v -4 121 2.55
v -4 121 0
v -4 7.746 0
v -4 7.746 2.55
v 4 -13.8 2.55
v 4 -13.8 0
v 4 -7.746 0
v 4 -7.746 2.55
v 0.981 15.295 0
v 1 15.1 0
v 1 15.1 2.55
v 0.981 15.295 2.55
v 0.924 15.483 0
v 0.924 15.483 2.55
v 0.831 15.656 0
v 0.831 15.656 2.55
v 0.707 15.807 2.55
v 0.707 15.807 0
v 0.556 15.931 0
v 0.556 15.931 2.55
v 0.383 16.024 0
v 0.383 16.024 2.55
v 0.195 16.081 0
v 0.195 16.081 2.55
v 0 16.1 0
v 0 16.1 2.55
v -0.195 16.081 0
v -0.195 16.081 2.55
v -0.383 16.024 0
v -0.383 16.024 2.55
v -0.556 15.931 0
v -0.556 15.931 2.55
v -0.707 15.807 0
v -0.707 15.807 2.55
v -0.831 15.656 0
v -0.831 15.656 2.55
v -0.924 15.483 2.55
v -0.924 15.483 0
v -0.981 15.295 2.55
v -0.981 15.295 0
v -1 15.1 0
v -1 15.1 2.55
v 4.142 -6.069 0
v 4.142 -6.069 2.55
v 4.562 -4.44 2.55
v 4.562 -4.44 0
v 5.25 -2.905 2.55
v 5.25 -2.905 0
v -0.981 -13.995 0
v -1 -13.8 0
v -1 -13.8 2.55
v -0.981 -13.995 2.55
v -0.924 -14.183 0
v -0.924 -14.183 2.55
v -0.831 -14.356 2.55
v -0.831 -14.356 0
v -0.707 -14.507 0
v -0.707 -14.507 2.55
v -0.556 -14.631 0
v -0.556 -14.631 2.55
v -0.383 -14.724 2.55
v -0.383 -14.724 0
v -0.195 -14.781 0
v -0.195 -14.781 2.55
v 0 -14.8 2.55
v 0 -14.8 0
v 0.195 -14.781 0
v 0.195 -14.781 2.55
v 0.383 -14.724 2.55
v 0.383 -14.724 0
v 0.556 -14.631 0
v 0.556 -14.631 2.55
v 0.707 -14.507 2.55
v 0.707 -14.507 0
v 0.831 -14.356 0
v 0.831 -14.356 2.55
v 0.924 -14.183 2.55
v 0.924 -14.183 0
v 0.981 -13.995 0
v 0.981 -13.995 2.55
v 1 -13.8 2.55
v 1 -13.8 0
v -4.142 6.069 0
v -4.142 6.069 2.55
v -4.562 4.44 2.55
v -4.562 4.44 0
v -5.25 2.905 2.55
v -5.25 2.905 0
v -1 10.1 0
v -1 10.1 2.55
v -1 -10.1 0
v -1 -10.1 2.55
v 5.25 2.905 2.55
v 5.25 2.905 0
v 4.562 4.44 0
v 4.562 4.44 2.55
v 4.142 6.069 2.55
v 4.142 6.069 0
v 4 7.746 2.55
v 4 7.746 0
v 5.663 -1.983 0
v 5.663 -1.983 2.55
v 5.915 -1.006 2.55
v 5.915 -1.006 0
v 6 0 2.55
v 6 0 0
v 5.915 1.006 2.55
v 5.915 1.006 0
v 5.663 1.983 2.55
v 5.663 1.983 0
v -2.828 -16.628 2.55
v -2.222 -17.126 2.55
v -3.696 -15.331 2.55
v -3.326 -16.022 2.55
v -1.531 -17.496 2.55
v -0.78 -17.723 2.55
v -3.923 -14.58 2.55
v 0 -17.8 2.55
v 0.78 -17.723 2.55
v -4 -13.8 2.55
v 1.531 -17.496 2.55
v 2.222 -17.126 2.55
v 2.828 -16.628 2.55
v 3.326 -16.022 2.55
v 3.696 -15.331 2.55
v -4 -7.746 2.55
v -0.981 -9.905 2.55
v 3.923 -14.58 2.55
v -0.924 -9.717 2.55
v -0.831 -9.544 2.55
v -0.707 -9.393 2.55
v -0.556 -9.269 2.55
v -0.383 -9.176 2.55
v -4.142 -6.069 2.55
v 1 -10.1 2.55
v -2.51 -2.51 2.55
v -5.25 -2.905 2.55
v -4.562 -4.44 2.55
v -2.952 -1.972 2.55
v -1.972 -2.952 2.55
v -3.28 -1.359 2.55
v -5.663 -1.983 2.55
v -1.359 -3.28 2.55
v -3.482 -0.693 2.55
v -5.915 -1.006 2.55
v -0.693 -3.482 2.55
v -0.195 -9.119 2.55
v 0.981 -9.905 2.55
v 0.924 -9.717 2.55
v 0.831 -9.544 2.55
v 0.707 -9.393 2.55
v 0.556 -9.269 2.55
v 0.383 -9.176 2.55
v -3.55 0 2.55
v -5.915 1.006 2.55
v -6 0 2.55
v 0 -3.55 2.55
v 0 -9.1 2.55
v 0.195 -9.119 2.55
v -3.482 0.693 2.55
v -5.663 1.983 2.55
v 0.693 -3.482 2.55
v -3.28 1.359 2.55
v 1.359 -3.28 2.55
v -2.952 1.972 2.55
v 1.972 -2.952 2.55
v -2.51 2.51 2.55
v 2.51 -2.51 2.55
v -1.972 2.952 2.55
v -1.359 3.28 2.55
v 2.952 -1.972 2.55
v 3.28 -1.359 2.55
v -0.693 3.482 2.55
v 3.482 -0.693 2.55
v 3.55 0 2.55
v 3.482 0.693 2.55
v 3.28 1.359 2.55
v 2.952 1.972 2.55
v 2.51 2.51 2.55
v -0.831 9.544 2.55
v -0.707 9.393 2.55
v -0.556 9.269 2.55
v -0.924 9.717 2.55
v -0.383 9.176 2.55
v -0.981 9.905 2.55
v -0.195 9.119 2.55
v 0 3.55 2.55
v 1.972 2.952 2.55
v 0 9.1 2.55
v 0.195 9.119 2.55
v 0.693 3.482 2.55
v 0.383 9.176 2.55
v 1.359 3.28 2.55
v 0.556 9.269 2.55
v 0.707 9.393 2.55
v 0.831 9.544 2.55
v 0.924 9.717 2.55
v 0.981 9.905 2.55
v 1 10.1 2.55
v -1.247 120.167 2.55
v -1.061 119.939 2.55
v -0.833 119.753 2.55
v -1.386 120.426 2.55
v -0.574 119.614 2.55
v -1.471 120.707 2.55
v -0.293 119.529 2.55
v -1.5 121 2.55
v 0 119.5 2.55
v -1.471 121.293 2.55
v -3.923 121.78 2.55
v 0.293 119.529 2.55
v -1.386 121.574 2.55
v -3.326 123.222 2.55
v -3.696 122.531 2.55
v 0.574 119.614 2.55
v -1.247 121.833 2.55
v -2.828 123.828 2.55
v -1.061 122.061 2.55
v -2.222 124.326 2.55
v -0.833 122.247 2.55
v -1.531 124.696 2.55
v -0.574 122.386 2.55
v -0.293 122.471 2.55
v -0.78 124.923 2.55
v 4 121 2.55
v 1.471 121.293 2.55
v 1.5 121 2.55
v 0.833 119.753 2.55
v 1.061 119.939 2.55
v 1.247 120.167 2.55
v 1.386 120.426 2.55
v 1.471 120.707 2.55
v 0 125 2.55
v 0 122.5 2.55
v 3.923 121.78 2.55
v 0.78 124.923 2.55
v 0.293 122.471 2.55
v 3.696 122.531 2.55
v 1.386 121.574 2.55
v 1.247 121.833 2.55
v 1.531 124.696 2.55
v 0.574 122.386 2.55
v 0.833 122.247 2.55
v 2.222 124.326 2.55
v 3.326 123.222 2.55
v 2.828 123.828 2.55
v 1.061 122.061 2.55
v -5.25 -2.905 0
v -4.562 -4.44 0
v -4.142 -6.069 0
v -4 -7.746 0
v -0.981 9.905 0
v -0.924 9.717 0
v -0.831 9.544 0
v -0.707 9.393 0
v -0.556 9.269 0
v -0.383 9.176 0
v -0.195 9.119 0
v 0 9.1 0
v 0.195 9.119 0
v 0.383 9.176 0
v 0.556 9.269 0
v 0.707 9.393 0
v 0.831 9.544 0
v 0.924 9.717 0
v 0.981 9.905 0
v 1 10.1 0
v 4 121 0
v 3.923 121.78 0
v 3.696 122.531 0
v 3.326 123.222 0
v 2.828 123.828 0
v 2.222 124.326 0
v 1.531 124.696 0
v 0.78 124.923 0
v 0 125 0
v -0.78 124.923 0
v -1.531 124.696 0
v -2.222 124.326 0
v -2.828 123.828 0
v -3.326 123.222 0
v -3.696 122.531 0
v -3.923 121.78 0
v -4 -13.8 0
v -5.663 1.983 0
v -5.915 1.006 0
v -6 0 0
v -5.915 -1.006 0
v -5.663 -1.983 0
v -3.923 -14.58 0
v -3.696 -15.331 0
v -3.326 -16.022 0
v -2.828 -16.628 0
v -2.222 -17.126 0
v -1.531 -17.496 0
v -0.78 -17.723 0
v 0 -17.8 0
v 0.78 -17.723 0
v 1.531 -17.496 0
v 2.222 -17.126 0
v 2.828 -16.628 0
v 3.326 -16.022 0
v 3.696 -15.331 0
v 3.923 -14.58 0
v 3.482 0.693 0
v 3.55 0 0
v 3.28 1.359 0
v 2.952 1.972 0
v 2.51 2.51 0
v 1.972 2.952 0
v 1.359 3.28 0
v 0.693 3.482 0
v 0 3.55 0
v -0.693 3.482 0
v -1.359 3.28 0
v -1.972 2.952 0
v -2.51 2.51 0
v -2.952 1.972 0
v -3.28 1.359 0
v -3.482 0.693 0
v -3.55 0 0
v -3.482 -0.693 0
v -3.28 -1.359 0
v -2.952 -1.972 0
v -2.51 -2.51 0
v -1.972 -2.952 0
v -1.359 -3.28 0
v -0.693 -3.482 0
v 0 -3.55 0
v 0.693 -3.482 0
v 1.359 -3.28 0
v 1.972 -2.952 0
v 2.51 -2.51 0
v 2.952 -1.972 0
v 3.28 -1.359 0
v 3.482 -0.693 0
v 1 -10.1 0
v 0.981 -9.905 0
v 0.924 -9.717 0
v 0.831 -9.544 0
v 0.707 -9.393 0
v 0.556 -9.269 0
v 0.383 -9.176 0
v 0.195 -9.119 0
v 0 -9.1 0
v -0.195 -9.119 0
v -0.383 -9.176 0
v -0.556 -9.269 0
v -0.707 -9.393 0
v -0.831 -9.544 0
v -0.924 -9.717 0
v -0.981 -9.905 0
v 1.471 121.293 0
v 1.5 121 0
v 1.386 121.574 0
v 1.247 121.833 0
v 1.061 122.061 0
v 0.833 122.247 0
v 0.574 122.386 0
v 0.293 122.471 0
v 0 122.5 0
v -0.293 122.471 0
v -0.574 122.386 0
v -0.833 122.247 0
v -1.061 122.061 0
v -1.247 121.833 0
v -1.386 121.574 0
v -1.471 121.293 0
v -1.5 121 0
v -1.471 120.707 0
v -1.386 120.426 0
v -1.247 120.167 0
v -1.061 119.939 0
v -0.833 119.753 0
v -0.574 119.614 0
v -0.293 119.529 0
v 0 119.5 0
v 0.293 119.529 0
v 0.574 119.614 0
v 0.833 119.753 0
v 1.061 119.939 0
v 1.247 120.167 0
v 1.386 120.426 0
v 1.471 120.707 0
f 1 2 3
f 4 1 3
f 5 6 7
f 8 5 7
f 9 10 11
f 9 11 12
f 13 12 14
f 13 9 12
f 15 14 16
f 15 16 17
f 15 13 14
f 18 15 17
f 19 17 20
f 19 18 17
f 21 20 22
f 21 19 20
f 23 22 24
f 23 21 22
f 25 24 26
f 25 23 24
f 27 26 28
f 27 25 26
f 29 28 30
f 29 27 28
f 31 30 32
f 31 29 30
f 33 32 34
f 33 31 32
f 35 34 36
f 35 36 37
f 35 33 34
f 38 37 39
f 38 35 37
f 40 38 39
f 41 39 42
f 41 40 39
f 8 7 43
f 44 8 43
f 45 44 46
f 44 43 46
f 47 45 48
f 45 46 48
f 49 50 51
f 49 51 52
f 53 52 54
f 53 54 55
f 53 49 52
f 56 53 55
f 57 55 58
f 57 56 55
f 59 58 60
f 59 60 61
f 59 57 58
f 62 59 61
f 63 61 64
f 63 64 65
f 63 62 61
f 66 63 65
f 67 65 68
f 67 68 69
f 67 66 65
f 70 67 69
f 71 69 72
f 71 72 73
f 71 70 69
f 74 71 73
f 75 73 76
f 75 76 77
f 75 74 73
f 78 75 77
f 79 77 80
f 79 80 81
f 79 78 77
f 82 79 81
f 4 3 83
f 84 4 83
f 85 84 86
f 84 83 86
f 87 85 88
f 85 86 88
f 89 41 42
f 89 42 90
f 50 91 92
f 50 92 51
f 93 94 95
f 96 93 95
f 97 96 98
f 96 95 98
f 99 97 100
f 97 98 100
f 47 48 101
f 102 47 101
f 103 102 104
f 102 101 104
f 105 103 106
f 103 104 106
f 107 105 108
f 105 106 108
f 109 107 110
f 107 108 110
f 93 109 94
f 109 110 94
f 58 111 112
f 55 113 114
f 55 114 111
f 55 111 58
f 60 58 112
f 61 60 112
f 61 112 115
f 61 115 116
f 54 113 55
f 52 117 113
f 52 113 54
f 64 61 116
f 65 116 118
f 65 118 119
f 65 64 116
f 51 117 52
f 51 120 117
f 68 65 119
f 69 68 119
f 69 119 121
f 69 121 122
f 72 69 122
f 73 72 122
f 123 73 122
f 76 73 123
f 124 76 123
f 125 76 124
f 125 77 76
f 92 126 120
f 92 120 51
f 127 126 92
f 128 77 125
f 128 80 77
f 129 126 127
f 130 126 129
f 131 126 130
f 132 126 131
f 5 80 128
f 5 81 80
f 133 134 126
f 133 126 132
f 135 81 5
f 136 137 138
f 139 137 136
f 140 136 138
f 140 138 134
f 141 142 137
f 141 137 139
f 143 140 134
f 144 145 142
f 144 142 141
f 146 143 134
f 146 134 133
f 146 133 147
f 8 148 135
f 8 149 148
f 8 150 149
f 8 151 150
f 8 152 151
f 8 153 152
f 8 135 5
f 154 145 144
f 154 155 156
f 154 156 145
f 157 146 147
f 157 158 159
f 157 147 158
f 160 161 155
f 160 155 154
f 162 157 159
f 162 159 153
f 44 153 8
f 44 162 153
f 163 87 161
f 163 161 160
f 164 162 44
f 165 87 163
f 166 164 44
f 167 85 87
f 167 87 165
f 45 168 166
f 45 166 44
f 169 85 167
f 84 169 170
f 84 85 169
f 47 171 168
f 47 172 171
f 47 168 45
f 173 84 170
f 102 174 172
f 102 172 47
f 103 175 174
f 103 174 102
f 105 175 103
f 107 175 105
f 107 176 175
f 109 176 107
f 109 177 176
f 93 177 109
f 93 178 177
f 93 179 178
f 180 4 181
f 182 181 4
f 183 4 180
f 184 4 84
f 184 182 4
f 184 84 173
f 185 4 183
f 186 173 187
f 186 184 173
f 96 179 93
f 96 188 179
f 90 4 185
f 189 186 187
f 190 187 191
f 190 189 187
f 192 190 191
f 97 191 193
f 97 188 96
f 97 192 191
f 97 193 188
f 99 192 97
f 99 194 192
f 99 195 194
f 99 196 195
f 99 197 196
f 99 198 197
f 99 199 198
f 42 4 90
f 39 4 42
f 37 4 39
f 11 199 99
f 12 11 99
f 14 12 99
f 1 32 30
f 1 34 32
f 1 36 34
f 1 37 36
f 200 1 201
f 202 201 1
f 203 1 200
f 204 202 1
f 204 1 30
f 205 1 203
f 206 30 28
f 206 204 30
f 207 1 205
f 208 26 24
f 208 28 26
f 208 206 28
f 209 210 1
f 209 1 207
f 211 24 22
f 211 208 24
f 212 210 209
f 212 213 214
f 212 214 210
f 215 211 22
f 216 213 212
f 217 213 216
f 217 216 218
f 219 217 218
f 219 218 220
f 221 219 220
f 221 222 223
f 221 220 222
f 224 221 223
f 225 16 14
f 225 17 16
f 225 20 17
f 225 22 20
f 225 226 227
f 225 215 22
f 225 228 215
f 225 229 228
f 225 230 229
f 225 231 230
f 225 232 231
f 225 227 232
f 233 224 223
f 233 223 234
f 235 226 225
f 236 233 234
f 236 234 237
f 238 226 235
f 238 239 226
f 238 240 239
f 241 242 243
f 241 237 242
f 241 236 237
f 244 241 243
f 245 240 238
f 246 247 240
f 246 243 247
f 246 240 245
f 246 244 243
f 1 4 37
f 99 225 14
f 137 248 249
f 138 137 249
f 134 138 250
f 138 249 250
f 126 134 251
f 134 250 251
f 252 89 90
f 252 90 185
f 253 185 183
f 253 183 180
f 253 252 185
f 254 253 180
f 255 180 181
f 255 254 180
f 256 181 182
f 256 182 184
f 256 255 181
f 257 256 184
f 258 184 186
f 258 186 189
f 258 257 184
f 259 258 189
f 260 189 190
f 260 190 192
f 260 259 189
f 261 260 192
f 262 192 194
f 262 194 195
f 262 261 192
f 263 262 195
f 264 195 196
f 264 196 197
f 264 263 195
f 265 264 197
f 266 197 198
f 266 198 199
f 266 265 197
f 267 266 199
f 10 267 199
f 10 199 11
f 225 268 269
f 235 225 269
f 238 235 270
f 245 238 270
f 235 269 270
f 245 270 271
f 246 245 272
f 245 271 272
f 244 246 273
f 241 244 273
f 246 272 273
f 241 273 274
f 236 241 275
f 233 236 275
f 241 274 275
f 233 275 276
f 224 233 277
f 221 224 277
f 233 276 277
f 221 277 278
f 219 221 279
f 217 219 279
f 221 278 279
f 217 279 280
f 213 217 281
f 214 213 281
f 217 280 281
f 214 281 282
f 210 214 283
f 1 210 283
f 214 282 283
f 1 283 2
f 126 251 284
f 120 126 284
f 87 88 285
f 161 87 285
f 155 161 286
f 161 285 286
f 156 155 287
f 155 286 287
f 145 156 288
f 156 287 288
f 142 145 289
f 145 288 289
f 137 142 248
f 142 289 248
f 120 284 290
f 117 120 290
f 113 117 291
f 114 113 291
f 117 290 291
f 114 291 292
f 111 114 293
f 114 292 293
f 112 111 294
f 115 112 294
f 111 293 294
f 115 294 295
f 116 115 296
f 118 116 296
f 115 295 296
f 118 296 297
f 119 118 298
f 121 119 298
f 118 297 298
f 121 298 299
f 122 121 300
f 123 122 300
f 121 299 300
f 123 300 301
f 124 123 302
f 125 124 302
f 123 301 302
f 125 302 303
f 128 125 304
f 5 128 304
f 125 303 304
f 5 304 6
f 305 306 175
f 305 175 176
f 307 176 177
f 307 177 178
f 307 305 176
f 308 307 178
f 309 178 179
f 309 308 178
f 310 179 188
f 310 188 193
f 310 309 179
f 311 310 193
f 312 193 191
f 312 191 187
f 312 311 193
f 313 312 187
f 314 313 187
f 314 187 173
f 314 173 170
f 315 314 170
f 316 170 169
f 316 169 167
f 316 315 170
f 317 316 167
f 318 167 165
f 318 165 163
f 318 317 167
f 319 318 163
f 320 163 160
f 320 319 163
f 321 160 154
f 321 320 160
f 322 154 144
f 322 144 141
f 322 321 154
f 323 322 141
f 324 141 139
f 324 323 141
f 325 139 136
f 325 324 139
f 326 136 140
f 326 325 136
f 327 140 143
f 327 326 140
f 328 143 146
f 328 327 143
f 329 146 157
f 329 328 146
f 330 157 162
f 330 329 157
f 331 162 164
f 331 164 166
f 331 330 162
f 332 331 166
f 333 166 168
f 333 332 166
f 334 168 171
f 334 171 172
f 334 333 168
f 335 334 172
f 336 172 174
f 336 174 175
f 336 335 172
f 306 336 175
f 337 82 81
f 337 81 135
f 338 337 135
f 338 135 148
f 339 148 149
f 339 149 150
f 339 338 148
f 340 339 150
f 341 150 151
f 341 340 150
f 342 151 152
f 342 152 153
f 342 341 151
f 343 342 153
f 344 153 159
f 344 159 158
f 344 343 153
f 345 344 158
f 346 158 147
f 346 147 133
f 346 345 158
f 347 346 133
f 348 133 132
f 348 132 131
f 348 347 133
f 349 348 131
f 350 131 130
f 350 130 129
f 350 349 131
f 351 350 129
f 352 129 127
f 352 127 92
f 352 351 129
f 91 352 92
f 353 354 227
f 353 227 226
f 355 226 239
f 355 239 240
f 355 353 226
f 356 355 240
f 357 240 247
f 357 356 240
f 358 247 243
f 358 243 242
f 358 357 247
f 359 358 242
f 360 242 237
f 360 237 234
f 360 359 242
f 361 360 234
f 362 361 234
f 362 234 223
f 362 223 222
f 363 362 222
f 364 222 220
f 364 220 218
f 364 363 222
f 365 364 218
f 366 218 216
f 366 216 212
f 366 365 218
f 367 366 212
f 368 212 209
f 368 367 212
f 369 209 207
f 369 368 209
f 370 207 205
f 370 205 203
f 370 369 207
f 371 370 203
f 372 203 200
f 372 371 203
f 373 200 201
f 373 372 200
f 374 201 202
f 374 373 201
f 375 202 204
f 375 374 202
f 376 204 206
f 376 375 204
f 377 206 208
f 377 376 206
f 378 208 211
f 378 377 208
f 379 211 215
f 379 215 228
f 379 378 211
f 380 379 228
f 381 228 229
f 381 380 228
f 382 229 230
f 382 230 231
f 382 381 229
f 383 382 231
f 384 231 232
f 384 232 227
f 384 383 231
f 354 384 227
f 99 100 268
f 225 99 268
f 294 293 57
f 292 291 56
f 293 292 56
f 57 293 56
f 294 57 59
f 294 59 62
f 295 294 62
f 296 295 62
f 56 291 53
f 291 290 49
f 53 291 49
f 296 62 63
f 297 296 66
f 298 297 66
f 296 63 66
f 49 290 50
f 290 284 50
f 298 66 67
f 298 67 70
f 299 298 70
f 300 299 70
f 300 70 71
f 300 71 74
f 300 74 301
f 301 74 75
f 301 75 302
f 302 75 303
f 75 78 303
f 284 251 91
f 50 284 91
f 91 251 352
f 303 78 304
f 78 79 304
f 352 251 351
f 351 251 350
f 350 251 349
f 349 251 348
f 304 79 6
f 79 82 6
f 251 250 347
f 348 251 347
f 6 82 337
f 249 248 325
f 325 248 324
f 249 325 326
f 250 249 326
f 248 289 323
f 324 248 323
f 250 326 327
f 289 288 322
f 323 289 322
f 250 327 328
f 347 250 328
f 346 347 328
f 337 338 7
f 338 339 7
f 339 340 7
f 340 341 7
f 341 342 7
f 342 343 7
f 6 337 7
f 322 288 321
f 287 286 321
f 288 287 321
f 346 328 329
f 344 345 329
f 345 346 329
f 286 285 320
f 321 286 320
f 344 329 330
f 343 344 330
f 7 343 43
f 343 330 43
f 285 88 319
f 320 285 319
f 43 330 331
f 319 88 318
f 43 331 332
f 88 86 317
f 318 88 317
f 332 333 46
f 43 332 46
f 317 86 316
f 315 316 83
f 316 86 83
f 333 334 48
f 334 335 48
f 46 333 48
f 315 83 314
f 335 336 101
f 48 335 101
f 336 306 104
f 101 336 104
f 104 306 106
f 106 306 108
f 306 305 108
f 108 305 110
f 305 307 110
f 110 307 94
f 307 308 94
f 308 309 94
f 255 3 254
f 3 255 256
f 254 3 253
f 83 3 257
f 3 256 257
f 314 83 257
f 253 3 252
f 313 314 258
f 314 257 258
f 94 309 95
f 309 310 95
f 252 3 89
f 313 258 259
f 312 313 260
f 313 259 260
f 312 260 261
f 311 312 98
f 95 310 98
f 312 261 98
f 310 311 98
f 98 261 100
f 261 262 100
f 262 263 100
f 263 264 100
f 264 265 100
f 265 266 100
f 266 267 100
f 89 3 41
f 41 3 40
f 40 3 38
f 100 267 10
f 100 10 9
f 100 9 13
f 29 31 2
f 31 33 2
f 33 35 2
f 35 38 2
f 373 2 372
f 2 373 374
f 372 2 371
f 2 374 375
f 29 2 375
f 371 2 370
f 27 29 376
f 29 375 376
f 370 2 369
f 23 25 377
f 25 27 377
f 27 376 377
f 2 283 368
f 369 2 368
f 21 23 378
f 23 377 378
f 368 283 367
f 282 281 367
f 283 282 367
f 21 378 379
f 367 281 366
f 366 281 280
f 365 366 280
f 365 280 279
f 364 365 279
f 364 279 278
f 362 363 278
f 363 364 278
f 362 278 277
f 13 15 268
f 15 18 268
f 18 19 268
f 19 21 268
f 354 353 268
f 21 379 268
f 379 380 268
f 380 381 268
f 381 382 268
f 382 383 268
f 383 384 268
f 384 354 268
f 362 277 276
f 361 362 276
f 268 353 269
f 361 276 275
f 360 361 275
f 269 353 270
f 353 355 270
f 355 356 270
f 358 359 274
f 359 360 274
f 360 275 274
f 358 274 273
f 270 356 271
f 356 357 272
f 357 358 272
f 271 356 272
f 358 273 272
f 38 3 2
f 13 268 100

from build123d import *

# Parameters (mm, degrees)
MODEL_R             = 3.55
MODEL_R_2           = 1.5
BOSS_EXTRUDE1_DEPTH = 2.55


with BuildPart() as part:
    # Model → Boss-Extrude1 (new body)
    with BuildSketch(Plane.XY):
        with BuildLine():
            Line((-4, 121), (-4, 7.745966692))
            ThreePointArc((-4, 7.745966692), (-4.317541634, 5.245966692), (-5.25, 2.90473751))
            ThreePointArc((-5.25, 2.90473751), (-6, 0), (-5.25, -2.90473751))
            ThreePointArc((-5.25, -2.90473751), (-4.317541634, -5.245966692), (-4, -7.745966692))
            Line((-4, -7.745966692), (-4, -13.8))
            ThreePointArc((-4, -13.8), (0, -17.8), (4, -13.8))
            Line((4, -13.8), (4, -7.745966692))
            ThreePointArc((4, -7.745966692), (4.317541634, -5.245966692), (5.25, -2.90473751))
            ThreePointArc((5.25, -2.90473751), (6, 0), (5.25, 2.90473751))
            ThreePointArc((5.25, 2.90473751), (4.317541634, 5.245966692), (4, 7.745966692))
            Line((4, 7.745966692), (4, 121))
            ThreePointArc((4, 121), (0, 125), (-4, 121))
        make_face()
        Circle(MODEL_R, mode=Mode.SUBTRACT)
        with Locations((0, 121)):
            Circle(MODEL_R_2, mode=Mode.SUBTRACT)
        with BuildLine():
            Line((-1, -10.1), (-1, -13.8))
            ThreePointArc((-1, -13.8), (0, -14.8), (1, -13.8))
            Line((1, -13.8), (1, -10.1))
            ThreePointArc((1, -10.1), (0, -9.1), (-1, -10.1))
        make_face(mode=Mode.SUBTRACT)
        with BuildLine():
            Line((-1, 15.1), (-1, 10.1))
            ThreePointArc((-1, 10.1), (0, 9.1), (1, 10.1))
            Line((1, 10.1), (1, 15.1))
            ThreePointArc((1, 15.1), (0, 16.1), (-1, 15.1))
        make_face(mode=Mode.SUBTRACT)
    extrude(amount=BOSS_EXTRUDE1_DEPTH)


solid = part.part
